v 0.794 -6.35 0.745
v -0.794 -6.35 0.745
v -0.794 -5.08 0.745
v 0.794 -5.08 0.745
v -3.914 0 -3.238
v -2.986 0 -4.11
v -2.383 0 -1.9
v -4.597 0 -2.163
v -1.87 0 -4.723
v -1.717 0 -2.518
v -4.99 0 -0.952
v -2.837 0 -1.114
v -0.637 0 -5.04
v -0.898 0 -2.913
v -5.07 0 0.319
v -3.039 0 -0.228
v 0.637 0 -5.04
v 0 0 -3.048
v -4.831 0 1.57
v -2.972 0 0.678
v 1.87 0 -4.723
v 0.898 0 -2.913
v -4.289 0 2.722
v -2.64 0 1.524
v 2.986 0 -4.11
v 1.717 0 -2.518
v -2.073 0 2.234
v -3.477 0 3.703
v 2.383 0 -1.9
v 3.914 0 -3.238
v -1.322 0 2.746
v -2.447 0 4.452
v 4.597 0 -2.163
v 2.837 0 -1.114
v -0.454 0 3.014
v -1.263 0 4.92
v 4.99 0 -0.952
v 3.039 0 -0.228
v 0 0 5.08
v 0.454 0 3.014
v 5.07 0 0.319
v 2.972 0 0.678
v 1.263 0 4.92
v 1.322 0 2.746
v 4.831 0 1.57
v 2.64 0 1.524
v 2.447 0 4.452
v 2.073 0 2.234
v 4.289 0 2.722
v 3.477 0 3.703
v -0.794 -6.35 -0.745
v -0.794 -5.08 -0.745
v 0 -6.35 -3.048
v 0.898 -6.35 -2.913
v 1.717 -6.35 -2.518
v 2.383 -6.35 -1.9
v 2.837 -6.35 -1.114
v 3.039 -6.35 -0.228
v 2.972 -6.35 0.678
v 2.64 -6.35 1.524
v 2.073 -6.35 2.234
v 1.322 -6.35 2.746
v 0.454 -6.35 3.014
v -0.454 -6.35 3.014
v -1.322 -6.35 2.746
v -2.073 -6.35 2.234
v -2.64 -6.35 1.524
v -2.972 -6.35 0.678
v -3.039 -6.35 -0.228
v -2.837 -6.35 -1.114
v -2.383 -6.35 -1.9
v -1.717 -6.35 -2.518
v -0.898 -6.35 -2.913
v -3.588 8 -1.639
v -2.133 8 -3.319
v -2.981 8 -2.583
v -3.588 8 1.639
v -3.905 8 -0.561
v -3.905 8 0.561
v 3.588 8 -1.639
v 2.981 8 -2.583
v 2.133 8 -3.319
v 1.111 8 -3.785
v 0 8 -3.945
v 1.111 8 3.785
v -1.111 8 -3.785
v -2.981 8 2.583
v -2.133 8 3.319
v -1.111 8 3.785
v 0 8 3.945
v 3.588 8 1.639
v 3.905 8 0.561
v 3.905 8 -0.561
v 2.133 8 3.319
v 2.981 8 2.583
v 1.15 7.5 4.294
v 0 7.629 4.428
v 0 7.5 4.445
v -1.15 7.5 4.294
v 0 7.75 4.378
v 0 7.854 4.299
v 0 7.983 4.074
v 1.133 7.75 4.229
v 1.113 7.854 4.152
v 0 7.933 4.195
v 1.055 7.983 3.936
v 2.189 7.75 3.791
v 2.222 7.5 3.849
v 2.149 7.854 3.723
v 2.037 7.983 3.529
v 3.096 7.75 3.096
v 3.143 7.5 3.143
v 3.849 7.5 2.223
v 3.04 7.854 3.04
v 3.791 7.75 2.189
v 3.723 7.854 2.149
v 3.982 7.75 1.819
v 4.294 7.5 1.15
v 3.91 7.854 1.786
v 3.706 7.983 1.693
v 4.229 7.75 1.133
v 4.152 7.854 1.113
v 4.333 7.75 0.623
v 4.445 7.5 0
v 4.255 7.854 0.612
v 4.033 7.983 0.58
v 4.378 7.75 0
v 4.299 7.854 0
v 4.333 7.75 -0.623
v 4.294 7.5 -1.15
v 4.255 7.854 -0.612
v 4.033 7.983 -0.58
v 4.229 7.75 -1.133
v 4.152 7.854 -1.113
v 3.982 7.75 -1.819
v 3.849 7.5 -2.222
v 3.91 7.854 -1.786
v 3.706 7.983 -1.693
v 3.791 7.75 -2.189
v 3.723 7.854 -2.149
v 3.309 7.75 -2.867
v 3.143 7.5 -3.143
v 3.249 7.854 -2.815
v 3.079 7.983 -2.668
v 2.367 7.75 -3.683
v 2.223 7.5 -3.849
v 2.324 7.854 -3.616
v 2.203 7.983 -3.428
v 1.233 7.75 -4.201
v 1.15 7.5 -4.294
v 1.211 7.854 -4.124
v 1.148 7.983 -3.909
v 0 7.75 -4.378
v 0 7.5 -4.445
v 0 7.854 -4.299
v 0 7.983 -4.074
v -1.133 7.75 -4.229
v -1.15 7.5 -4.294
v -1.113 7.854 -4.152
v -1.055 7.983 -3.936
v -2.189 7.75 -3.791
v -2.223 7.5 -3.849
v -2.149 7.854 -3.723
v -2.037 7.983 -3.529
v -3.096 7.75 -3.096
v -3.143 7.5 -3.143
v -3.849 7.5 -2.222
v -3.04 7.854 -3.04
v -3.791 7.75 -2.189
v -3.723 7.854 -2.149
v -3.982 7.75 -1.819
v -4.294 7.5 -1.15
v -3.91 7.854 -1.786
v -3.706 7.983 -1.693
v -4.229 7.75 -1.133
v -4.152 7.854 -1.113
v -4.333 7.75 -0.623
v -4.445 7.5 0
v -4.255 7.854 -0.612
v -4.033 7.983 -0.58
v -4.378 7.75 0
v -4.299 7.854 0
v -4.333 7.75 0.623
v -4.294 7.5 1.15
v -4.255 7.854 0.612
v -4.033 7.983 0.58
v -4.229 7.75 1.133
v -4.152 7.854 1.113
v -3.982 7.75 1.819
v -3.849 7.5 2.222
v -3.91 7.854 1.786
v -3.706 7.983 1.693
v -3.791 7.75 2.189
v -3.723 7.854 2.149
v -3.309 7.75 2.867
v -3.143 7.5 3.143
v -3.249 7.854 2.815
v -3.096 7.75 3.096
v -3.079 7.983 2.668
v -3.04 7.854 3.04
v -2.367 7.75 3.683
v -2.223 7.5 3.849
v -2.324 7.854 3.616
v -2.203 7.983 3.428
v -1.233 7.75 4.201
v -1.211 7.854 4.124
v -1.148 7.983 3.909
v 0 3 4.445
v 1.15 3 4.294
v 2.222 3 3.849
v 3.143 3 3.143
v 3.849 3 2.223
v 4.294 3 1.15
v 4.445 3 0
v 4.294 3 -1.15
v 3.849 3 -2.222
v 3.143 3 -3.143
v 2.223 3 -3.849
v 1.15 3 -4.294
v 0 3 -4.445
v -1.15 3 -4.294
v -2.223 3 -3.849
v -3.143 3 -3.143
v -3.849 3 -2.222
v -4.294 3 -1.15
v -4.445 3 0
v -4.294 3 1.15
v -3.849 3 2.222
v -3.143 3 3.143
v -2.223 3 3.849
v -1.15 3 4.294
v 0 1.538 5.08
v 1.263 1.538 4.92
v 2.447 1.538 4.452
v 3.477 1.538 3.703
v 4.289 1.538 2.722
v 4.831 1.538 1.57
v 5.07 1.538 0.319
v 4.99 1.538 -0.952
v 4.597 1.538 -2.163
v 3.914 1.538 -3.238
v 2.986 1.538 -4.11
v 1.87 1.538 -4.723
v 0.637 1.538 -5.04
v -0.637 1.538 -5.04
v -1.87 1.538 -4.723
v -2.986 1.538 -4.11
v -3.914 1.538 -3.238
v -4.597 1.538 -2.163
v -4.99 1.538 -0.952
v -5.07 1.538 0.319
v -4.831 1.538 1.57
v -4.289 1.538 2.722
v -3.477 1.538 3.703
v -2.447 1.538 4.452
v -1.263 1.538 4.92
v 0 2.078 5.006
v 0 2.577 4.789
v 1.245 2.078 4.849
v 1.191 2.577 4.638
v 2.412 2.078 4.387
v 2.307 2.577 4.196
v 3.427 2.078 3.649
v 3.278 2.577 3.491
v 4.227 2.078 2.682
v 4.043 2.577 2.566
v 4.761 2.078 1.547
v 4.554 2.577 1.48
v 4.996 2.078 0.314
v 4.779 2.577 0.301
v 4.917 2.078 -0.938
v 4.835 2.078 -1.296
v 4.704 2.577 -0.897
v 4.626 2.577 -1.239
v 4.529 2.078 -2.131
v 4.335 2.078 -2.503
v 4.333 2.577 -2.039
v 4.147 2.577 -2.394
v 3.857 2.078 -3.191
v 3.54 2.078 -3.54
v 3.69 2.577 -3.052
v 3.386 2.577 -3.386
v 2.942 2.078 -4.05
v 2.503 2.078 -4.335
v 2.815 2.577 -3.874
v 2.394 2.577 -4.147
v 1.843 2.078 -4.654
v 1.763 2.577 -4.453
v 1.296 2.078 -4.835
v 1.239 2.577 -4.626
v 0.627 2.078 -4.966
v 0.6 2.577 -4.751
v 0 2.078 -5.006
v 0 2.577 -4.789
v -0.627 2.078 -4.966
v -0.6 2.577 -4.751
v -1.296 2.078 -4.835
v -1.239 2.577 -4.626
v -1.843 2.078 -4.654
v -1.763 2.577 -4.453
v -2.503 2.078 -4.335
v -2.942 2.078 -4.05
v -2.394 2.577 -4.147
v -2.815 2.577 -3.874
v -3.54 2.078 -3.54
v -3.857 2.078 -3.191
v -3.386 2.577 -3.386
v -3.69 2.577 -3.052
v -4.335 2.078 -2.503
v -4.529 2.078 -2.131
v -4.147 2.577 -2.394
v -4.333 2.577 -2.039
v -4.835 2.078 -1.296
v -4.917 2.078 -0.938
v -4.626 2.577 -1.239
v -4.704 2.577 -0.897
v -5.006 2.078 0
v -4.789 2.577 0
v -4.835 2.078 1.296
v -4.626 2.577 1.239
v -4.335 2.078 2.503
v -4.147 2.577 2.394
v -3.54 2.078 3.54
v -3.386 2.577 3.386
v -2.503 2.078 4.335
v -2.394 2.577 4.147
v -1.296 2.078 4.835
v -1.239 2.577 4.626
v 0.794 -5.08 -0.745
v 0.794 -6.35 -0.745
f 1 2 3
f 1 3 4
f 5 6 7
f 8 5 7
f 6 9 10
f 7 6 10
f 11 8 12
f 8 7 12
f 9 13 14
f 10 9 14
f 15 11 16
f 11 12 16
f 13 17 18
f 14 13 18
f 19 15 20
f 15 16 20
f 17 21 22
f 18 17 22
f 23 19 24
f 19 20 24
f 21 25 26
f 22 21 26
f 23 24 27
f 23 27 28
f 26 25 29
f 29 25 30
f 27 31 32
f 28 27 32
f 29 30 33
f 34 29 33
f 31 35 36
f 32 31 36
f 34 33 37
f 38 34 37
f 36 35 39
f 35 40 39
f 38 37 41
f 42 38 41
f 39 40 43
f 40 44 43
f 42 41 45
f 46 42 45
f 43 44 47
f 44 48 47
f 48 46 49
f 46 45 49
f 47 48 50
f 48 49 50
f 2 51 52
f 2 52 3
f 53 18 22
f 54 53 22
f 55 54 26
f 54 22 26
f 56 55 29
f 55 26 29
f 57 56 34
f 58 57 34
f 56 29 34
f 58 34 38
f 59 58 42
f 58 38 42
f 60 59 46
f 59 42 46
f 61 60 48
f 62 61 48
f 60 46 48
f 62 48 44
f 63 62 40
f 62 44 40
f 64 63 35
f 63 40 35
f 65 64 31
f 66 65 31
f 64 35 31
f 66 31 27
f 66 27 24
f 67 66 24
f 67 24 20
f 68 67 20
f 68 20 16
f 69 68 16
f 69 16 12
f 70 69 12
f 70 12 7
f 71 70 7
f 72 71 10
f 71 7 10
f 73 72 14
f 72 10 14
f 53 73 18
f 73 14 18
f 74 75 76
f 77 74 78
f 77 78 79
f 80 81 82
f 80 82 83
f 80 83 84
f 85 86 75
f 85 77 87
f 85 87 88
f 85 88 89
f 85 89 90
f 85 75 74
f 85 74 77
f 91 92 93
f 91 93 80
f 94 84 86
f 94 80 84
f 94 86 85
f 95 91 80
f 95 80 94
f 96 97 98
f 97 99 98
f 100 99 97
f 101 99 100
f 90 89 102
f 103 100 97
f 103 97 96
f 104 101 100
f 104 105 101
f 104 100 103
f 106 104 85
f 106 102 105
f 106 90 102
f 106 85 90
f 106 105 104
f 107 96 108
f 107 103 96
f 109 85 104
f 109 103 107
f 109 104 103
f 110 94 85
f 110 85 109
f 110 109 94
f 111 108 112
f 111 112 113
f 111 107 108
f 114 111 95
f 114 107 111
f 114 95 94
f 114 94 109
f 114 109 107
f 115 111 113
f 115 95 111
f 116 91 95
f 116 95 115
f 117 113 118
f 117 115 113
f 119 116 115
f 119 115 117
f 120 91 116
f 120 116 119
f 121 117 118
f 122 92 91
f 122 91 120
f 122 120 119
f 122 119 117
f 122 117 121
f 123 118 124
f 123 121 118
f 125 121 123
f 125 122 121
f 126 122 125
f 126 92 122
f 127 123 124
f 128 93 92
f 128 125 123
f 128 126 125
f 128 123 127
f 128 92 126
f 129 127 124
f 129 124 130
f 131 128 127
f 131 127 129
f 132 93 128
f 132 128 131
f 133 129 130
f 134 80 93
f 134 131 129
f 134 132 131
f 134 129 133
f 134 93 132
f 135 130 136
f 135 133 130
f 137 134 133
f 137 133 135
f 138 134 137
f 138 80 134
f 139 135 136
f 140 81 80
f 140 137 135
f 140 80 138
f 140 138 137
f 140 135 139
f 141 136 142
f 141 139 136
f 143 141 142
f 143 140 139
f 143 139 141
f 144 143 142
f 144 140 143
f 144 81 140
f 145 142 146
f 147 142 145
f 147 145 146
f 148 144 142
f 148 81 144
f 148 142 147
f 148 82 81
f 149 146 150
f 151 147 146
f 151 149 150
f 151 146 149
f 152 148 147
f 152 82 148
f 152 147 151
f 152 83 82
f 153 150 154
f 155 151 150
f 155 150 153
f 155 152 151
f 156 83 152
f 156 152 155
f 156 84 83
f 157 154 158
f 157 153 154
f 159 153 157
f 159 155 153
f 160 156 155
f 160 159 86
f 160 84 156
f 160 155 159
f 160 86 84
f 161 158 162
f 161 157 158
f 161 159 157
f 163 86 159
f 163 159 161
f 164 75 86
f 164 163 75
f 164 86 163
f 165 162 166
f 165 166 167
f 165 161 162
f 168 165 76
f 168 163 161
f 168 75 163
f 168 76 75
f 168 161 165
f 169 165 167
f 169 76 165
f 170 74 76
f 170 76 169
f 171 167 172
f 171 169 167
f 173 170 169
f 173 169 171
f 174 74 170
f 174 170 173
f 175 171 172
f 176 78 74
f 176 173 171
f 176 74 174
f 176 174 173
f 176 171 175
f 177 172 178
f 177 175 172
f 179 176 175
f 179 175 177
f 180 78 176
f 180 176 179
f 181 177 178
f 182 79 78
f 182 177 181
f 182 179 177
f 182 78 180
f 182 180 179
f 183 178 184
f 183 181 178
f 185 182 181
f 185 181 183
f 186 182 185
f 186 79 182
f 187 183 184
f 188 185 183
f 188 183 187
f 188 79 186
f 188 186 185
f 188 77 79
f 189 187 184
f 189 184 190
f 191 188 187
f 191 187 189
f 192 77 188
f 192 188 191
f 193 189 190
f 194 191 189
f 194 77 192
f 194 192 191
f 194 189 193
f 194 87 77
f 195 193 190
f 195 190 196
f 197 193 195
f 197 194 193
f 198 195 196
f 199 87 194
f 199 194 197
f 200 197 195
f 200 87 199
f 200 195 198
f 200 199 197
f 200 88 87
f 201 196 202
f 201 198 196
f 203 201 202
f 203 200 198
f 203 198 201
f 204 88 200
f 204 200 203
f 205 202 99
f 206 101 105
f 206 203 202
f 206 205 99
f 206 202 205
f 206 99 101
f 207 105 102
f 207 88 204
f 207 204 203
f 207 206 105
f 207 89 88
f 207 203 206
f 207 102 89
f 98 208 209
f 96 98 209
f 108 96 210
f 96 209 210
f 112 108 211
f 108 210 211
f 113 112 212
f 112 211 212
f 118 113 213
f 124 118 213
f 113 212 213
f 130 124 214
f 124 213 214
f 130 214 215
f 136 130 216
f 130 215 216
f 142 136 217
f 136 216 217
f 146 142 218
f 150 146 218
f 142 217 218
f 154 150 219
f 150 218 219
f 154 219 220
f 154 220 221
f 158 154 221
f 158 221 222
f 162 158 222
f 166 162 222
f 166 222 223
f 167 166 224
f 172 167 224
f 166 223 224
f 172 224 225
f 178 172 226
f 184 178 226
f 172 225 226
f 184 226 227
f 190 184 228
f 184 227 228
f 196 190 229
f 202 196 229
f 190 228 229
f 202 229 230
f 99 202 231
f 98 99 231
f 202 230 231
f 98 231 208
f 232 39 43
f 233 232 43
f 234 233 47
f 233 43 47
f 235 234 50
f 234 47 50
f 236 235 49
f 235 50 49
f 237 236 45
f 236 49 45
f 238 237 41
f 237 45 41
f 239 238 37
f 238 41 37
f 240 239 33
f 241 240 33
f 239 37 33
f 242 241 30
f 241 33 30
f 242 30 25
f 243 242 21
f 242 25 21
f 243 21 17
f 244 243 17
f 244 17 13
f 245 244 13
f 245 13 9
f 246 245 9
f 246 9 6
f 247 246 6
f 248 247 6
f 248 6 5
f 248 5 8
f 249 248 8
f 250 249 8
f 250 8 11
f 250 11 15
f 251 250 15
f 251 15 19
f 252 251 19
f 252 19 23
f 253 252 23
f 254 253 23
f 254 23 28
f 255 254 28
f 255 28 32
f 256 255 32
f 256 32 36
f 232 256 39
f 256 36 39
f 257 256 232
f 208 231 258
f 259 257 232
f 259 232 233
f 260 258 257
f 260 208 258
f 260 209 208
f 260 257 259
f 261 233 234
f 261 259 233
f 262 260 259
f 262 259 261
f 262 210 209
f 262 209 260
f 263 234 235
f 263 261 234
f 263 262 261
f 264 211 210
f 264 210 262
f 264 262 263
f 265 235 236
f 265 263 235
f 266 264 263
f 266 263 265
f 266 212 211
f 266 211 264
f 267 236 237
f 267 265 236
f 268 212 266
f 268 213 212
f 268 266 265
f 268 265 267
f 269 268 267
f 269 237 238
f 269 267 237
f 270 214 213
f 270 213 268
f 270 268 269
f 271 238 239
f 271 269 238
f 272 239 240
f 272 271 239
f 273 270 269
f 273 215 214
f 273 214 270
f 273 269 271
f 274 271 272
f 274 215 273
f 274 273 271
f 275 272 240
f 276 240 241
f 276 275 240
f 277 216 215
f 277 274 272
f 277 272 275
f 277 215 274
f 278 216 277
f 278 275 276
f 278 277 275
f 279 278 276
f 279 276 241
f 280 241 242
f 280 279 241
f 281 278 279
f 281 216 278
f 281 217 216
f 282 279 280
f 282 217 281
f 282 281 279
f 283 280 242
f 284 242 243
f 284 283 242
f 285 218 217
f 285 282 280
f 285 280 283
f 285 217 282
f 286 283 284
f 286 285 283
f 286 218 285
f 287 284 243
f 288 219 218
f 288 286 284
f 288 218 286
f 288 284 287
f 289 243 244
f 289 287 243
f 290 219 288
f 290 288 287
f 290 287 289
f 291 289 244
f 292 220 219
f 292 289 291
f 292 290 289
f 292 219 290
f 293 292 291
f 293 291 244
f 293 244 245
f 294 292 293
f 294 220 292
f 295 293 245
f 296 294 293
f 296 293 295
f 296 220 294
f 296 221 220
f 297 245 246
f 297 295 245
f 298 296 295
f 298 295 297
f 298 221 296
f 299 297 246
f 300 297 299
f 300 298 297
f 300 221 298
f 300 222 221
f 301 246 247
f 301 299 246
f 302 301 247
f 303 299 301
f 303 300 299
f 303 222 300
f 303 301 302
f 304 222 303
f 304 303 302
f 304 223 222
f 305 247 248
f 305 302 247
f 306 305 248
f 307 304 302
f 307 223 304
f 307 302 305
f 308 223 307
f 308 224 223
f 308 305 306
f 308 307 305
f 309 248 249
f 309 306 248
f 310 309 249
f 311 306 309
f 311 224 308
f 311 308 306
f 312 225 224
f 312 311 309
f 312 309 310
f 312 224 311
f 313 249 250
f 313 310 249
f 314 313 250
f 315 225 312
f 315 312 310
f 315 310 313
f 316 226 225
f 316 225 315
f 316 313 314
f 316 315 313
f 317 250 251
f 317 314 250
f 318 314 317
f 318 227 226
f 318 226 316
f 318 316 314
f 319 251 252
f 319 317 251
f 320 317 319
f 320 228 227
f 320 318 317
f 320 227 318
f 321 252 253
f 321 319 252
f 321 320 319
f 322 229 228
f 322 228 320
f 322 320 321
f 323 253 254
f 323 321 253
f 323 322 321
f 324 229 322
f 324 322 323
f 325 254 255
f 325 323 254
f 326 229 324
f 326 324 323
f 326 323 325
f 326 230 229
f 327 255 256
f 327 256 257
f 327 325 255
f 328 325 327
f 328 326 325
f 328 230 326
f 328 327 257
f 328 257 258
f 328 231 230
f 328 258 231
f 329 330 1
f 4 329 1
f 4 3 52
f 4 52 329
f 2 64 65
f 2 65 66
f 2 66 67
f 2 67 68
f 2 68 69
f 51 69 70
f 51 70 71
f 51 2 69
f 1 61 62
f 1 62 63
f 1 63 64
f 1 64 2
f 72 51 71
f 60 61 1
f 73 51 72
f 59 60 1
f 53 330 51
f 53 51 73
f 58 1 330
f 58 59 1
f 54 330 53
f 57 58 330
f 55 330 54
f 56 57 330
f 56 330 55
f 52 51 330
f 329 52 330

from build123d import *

# Parameters (mm, degrees)
SKETCH1_R           = 5.08
BOSS_EXTRUDE1_DEPTH = 3
SKETCH2_R           = 4.445
BOSS_EXTRUDE2_DEPTH = 5
FILLET2_R           = 2
FILLET3_R           = 0.5
SKETCH3_R           = 3.048
BOSS_EXTRUDE3_DEPTH = 6.35
SKETCH4_W           = 1.587384834
SKETCH4_H           = 1.489913834
CUT_EXTRUDE1_DEPTH  = 1.27


with BuildPart() as part:
    # Sketch1 → Boss-Extrude1 (new body)
    with BuildSketch(Plane(origin=(0, 0, 0), x_dir=(1, 0, 0), z_dir=(0, 1, 0))):
        with Locations(Location((0, 0, 0), (0, 0, 270))):
            Circle(SKETCH1_R)
    extrude(amount=BOSS_EXTRUDE1_DEPTH)

    # Sketch2 → Boss-Extrude2 (add)
    with BuildSketch(Plane(origin=(0, 3, 0), x_dir=(1, 0, 0), z_dir=(0, 1, 0))):
        with Locations(Location((0, 0, 0), (0, 0, 270))):
            Circle(SKETCH2_R)
    extrude(amount=BOSS_EXTRUDE2_DEPTH)

    # Fillet2
    # the kernel refuses this fillet: 2 mm, written as the material it takes off along each edge
    with BuildSketch(Plane(origin=(0, 3, 0), x_dir=(0, 0, 1), z_dir=(-1, 0, 0))) as fillet2_piece_1:
        with BuildLine():
            CenterArc((3.08, -1.461771186), FILLET2_R, 0, 46.960687898)
            Line((4.445, 0), (4.4723, 0.029235424))
            ThreePointArc((4.4723, 0.029235424), (4.7625, 0.04), (5.08, 0.04))
            Line((5.08, 0.04), (5.12, 0))
            Line((5.12, 0), (5.12, -1.461771186))
            Line((5.12, -1.461771186), (5.08, -1.461771186))
        make_face()
    revolve(axis=Axis((0, 3, 0), (0, 1, 0)), mode=Mode.SUBTRACT)

    # Fillet3
    fillet3_edges = [part.edges().sort_by_distance(p)[0] for p in [
        (0, 8, -4.445),
    ]]
    fillet(fillet3_edges, radius=FILLET3_R)

    # Sketch3 → Boss-Extrude3 (add)
    with BuildSketch(Plane.XZ):
        with Locations(Location((0, 0, 0), (0, 0, 270))):
            Circle(SKETCH3_R)
    extrude(amount=BOSS_EXTRUDE3_DEPTH)

    # Sketch4 → Cut-Extrude1 (cut)
    with BuildSketch(Plane.XZ.offset(6.35)):
        Rectangle(SKETCH4_W, SKETCH4_H)
    extrude(amount=-CUT_EXTRUDE1_DEPTH, mode=Mode.SUBTRACT)


solid = part.part
